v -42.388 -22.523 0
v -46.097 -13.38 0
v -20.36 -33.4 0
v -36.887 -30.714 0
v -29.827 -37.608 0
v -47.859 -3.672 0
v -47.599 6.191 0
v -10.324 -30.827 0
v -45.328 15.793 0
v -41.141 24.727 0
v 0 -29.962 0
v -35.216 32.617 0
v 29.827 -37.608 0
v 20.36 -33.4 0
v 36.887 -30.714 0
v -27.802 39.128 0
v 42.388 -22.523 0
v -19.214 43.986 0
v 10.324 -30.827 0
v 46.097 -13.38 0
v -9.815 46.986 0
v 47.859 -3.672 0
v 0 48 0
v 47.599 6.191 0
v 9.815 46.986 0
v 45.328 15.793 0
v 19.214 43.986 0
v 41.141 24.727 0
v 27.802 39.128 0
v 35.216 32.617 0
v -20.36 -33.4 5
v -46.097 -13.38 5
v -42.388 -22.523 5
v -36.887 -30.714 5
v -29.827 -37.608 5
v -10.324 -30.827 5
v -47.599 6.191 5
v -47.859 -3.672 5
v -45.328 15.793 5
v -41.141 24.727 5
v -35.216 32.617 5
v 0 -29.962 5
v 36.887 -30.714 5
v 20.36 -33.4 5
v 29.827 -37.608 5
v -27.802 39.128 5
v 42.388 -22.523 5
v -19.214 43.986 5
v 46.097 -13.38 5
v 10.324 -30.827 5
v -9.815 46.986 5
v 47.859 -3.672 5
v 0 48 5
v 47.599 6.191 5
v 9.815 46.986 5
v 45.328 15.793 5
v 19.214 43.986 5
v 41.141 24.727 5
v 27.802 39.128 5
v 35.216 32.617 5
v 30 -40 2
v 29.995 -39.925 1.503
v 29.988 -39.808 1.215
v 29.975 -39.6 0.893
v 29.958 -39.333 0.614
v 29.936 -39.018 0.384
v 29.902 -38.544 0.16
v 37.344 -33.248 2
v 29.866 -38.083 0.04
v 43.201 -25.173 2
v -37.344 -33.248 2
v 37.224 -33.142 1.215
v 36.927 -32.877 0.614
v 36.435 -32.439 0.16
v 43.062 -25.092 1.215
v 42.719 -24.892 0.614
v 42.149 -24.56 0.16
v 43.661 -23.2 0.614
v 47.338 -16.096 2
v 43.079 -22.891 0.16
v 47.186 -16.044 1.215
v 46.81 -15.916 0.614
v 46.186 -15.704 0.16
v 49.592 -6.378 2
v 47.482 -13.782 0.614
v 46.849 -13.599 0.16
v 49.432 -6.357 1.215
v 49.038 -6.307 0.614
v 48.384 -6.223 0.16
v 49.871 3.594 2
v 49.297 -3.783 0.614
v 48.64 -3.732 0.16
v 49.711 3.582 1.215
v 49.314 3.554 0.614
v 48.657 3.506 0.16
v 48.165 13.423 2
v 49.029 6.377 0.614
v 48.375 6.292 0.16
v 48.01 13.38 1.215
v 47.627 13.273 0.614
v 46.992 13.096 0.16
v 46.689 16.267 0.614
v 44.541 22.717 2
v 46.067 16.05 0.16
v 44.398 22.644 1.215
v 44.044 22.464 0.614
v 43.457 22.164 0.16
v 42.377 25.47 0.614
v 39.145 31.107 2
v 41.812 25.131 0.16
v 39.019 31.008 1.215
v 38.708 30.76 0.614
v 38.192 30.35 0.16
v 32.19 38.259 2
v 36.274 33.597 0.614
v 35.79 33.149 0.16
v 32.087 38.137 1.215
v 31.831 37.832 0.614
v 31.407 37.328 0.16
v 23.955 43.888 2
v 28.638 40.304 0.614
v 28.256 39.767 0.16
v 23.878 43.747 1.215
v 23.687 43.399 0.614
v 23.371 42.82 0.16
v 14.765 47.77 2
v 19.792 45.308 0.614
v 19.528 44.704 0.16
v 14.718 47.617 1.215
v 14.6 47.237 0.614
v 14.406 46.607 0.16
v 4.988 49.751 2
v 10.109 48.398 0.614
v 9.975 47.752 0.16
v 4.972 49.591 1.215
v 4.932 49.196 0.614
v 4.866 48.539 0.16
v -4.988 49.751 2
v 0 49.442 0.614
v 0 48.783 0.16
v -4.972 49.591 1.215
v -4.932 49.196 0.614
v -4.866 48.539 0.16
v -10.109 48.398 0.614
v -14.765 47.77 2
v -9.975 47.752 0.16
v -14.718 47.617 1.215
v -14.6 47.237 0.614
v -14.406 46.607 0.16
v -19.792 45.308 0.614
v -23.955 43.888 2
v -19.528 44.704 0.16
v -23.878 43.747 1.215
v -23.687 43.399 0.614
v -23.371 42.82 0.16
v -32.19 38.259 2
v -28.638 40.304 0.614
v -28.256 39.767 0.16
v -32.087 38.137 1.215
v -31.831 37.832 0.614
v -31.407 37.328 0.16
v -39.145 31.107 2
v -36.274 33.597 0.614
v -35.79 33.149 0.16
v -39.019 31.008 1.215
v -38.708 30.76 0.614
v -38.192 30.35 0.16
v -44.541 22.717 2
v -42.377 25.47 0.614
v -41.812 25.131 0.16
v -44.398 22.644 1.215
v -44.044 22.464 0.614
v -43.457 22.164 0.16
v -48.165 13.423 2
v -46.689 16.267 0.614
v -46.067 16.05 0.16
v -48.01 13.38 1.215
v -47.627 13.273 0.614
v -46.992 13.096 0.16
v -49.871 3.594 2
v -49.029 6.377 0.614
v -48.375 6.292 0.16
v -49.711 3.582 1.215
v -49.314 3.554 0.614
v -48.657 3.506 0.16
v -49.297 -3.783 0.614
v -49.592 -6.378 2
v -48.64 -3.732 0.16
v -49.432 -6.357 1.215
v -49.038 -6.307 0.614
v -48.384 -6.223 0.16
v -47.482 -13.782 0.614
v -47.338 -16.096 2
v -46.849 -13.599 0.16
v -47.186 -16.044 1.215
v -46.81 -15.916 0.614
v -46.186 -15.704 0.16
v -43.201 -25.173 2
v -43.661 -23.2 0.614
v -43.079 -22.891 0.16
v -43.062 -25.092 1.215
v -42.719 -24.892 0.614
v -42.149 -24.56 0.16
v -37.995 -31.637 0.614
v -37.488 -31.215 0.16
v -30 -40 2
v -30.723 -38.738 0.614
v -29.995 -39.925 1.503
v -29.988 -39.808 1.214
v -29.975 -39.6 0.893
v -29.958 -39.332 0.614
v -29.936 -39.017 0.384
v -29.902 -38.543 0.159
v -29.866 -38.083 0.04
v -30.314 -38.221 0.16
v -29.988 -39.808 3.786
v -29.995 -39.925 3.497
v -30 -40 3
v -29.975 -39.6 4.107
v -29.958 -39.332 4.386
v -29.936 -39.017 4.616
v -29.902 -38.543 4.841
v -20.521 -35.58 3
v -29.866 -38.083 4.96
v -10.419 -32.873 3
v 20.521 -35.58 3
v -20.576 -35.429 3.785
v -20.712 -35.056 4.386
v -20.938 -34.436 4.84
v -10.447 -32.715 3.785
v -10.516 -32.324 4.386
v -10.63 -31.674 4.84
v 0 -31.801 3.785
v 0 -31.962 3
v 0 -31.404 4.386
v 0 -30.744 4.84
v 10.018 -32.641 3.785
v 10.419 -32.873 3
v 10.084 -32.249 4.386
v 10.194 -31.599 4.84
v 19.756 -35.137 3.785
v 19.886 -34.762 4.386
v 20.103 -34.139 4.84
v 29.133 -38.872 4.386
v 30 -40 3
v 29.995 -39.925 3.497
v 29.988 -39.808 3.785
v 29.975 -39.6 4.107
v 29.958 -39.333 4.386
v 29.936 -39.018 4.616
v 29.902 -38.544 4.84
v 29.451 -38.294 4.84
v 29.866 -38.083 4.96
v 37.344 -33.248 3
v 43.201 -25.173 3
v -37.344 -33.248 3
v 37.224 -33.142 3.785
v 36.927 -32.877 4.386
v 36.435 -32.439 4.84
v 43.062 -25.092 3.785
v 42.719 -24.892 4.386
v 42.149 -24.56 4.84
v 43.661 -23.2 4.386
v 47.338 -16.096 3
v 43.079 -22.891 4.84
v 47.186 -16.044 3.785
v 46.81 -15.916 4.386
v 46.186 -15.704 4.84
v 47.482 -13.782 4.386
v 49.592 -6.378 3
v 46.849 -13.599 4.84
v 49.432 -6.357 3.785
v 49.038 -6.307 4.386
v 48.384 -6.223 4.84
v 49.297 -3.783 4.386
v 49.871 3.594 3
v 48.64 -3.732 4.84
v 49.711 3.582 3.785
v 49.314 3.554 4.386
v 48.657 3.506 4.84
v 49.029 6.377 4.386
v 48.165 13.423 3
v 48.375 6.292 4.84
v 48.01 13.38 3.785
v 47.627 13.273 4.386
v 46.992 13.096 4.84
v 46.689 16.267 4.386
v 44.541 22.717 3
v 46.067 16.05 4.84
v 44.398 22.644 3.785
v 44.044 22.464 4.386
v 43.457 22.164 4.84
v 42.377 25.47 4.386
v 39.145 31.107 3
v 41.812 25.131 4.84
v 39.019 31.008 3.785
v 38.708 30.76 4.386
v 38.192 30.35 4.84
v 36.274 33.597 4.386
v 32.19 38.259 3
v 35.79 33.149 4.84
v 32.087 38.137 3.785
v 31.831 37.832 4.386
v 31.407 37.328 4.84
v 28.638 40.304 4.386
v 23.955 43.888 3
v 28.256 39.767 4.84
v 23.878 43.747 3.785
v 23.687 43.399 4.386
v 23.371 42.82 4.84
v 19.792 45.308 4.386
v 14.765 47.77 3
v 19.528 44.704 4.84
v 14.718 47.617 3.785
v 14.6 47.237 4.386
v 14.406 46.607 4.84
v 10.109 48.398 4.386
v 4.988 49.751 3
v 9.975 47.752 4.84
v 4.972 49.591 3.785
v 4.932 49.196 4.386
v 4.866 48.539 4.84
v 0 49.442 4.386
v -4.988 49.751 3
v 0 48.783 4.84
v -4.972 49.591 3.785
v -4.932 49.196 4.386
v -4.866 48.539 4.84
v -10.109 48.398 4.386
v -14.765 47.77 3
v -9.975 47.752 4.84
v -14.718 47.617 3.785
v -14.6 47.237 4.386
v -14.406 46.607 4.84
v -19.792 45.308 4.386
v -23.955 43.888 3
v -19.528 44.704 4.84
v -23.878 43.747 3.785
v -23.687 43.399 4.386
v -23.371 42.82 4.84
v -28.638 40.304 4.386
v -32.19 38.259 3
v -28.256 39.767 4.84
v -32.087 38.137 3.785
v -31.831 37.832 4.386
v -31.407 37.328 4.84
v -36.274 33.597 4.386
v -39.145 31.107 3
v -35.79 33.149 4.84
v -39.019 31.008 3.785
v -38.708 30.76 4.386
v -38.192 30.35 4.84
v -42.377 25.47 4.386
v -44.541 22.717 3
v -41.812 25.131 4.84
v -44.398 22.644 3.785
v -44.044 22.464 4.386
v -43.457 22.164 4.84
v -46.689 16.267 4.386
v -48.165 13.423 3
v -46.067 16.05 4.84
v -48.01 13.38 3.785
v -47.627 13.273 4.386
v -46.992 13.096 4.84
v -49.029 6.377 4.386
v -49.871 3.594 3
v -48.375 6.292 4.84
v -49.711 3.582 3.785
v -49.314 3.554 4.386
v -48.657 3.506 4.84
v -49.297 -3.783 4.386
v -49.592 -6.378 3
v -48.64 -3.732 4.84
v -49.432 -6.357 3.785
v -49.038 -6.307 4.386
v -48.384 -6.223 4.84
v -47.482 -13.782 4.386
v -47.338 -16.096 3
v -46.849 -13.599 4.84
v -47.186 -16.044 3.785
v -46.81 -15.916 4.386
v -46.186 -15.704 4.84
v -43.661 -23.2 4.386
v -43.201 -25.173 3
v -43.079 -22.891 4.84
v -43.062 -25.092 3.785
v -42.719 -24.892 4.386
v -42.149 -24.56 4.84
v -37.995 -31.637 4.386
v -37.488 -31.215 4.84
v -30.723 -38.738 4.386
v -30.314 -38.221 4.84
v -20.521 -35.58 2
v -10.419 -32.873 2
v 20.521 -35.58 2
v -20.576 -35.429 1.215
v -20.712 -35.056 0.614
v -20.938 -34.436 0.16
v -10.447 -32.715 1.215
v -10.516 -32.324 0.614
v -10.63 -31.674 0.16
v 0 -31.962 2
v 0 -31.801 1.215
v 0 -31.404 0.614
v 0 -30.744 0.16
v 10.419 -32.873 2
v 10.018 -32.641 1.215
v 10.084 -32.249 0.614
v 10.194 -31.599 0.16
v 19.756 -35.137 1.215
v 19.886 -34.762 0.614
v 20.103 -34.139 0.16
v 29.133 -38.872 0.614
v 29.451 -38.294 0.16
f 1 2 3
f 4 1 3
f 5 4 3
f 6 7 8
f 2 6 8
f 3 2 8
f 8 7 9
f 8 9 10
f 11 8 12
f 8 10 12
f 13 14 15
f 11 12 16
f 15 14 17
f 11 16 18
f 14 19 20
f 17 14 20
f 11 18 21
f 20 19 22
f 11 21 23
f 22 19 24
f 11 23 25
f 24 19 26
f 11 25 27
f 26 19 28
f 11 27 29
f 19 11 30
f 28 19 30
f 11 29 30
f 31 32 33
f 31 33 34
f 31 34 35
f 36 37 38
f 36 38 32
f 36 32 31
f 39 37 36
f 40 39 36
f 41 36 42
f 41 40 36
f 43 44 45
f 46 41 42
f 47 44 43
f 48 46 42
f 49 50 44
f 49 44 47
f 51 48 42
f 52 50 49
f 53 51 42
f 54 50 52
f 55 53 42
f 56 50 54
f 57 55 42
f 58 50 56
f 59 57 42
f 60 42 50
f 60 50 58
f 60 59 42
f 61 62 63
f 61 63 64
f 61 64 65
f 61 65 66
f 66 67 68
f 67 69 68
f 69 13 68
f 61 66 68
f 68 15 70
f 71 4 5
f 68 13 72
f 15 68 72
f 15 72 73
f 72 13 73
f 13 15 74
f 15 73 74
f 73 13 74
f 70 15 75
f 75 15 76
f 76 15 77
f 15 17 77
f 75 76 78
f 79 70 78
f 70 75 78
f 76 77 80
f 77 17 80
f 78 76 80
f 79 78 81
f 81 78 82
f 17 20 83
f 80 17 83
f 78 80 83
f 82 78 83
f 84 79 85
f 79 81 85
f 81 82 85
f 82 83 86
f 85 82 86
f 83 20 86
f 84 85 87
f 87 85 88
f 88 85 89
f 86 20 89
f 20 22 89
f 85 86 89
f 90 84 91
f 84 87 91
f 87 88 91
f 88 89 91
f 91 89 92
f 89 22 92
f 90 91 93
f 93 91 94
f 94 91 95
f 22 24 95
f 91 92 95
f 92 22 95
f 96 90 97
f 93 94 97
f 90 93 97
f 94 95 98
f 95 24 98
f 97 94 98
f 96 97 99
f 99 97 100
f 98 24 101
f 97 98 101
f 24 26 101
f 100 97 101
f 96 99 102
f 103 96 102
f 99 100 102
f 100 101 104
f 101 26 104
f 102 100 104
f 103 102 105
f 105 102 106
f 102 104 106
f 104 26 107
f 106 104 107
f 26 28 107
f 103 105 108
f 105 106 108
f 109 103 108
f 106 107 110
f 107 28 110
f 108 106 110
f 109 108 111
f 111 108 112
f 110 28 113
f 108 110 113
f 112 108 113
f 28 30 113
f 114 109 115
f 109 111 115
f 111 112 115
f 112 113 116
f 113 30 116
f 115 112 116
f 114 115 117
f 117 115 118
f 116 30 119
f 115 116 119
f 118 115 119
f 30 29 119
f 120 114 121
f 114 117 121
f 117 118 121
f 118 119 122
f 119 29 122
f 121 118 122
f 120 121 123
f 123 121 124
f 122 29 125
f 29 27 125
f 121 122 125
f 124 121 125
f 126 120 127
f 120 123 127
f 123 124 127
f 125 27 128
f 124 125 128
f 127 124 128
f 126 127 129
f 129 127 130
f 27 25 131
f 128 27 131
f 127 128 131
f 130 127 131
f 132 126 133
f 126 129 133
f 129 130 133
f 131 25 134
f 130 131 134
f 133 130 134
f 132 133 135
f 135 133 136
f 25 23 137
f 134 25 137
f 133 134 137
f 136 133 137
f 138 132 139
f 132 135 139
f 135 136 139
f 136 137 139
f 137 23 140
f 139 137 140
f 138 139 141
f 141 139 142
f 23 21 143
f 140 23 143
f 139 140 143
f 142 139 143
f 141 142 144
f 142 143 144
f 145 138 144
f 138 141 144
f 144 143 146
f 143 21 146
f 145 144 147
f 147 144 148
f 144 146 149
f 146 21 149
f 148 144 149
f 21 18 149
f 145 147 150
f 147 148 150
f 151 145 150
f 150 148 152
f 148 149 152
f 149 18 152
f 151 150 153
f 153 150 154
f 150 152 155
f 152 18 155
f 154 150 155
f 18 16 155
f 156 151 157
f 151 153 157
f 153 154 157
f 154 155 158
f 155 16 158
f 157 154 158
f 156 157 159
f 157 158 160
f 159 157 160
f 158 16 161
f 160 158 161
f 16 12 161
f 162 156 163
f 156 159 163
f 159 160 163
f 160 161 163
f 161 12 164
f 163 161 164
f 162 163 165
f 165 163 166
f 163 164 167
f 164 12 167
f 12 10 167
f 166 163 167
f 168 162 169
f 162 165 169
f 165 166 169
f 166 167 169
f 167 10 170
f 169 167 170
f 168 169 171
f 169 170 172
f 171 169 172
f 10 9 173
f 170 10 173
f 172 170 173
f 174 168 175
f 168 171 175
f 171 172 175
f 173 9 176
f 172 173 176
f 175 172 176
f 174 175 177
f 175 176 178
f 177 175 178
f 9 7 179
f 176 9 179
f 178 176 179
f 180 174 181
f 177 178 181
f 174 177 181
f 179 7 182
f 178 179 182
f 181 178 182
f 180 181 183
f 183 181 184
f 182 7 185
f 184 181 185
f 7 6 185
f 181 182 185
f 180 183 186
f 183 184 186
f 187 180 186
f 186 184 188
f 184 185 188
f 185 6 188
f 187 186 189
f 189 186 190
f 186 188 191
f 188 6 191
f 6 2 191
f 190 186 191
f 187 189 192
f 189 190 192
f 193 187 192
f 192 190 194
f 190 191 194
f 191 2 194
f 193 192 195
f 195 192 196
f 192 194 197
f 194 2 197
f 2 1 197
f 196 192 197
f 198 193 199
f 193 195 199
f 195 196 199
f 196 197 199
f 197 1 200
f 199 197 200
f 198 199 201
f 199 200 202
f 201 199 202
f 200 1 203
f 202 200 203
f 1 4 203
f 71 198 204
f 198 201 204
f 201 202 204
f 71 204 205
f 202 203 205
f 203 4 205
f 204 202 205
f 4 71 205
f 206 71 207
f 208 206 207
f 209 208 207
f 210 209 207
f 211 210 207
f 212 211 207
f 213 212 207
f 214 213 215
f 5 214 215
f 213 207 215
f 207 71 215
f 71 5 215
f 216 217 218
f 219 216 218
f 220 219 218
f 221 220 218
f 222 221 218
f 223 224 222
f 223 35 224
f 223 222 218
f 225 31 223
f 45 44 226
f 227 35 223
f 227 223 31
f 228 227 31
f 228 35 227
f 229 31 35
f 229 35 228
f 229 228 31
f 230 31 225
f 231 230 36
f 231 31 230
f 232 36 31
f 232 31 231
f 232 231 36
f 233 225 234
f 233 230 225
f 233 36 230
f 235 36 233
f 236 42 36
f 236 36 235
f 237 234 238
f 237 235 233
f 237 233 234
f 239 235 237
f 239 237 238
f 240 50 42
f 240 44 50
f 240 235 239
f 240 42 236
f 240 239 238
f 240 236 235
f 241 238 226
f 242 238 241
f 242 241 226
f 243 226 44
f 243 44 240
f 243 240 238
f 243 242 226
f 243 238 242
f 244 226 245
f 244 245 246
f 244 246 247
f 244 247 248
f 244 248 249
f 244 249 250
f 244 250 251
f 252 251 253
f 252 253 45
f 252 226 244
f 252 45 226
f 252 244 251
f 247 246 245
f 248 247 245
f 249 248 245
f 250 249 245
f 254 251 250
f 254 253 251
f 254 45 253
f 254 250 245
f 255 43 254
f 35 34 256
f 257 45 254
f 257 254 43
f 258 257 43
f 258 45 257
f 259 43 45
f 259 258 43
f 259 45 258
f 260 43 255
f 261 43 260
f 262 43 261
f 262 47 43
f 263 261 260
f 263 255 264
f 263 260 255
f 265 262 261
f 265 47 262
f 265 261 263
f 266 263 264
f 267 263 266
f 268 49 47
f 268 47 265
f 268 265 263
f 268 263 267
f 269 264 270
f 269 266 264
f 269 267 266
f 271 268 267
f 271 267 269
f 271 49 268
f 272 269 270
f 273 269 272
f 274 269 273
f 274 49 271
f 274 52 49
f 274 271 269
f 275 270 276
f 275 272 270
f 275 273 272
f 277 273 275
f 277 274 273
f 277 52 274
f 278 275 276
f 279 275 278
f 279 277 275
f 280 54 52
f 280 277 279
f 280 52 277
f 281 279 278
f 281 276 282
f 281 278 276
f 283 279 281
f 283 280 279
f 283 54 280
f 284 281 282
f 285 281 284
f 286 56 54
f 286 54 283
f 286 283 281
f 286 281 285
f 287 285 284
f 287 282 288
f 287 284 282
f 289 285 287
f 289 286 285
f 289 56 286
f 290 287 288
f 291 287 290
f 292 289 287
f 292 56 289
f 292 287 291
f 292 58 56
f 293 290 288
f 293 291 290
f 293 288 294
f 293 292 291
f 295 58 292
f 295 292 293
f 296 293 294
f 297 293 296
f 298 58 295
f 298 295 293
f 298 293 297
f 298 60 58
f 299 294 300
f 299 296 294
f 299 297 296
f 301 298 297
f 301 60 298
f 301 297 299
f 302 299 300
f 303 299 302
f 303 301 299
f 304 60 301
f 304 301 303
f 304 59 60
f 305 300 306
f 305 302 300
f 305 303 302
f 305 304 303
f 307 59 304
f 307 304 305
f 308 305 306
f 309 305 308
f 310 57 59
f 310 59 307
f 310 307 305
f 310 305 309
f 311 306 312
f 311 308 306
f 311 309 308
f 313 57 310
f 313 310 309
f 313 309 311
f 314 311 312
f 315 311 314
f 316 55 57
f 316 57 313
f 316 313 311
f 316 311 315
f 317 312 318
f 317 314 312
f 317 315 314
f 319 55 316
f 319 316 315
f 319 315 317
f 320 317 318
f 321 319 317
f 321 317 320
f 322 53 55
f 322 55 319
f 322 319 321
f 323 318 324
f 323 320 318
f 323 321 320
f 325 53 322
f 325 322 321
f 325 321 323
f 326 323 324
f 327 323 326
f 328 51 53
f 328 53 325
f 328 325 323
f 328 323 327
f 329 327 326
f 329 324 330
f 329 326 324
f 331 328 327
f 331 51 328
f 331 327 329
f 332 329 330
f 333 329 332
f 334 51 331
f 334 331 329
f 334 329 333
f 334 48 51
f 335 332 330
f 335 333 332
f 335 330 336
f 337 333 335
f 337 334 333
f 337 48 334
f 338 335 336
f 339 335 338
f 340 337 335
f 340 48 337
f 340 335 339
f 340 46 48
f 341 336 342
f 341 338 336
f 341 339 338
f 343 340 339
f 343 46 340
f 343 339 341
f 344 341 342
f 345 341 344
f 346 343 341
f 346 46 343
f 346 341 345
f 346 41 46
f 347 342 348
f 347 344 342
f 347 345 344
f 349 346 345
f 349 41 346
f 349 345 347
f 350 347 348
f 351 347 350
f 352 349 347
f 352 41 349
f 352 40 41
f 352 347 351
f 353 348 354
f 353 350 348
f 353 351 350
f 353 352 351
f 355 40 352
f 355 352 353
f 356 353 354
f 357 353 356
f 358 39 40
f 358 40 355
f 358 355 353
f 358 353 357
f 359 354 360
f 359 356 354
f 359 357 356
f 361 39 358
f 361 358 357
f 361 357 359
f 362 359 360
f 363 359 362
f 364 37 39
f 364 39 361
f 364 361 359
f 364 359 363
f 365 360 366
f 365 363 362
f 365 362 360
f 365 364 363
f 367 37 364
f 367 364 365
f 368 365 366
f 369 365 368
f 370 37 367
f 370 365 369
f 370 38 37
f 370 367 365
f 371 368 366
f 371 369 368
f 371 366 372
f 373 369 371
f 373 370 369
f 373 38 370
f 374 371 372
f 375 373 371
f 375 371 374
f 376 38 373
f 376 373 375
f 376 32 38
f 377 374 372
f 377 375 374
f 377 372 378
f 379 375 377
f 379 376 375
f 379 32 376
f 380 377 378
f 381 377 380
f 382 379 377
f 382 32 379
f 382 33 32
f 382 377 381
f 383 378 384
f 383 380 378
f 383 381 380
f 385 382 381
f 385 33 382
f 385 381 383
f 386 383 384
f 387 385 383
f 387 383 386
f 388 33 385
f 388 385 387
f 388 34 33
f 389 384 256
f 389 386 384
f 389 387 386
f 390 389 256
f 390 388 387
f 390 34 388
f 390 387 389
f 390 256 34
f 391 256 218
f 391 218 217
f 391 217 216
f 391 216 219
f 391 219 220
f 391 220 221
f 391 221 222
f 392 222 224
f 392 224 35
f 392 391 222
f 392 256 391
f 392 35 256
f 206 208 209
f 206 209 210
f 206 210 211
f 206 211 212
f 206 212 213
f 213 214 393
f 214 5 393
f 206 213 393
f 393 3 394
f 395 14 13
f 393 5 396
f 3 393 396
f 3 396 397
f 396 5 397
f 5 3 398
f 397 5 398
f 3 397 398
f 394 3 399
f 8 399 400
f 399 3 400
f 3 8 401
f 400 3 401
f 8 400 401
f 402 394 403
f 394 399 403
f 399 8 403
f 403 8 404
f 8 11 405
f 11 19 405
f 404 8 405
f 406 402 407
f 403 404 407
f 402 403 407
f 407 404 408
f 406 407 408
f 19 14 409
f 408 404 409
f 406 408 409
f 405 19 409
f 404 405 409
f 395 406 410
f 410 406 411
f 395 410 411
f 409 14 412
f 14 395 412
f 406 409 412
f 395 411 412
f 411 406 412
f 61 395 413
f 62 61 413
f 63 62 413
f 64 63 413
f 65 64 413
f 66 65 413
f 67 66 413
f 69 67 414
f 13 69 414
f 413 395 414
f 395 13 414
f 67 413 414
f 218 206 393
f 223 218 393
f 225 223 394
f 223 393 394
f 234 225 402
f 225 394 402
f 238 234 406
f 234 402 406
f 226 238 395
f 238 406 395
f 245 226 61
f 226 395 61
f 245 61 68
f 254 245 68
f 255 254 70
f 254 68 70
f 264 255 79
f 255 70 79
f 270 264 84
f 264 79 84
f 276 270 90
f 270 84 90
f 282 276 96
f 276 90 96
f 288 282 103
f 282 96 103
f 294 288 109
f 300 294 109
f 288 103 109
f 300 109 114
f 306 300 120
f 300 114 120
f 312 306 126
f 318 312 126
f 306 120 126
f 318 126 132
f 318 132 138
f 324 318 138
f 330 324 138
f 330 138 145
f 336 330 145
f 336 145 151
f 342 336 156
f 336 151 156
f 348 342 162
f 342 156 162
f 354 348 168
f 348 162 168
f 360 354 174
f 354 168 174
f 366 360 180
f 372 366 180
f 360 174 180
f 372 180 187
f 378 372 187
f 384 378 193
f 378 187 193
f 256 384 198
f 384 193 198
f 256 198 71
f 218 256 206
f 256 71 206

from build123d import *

# Parameters (mm, degrees)
F1_DEPTH = 5
F2_R     = 2


with BuildPart() as f1:
    # F0 (on Top) → F1 (new body)
    with BuildSketch(Plane.XY):
        with BuildLine():
            ThreePointArc((-30, -40), (0, -31.961524), (30, -40))
            ThreePointArc((30, -40), (0, 50), (-30, -40))
        make_face()
    extrude(amount=F1_DEPTH)

    # F2
    f2_edges = [f1.edges().sort_by_distance(p)[0] for p in [
        (0, -31.961524, 5),
        (0, 50, 5),
        (0, -31.961524, 0),
        (0, 50, 0),
    ]]
    fillet(f2_edges, radius=F2_R)


solid = f1.part
